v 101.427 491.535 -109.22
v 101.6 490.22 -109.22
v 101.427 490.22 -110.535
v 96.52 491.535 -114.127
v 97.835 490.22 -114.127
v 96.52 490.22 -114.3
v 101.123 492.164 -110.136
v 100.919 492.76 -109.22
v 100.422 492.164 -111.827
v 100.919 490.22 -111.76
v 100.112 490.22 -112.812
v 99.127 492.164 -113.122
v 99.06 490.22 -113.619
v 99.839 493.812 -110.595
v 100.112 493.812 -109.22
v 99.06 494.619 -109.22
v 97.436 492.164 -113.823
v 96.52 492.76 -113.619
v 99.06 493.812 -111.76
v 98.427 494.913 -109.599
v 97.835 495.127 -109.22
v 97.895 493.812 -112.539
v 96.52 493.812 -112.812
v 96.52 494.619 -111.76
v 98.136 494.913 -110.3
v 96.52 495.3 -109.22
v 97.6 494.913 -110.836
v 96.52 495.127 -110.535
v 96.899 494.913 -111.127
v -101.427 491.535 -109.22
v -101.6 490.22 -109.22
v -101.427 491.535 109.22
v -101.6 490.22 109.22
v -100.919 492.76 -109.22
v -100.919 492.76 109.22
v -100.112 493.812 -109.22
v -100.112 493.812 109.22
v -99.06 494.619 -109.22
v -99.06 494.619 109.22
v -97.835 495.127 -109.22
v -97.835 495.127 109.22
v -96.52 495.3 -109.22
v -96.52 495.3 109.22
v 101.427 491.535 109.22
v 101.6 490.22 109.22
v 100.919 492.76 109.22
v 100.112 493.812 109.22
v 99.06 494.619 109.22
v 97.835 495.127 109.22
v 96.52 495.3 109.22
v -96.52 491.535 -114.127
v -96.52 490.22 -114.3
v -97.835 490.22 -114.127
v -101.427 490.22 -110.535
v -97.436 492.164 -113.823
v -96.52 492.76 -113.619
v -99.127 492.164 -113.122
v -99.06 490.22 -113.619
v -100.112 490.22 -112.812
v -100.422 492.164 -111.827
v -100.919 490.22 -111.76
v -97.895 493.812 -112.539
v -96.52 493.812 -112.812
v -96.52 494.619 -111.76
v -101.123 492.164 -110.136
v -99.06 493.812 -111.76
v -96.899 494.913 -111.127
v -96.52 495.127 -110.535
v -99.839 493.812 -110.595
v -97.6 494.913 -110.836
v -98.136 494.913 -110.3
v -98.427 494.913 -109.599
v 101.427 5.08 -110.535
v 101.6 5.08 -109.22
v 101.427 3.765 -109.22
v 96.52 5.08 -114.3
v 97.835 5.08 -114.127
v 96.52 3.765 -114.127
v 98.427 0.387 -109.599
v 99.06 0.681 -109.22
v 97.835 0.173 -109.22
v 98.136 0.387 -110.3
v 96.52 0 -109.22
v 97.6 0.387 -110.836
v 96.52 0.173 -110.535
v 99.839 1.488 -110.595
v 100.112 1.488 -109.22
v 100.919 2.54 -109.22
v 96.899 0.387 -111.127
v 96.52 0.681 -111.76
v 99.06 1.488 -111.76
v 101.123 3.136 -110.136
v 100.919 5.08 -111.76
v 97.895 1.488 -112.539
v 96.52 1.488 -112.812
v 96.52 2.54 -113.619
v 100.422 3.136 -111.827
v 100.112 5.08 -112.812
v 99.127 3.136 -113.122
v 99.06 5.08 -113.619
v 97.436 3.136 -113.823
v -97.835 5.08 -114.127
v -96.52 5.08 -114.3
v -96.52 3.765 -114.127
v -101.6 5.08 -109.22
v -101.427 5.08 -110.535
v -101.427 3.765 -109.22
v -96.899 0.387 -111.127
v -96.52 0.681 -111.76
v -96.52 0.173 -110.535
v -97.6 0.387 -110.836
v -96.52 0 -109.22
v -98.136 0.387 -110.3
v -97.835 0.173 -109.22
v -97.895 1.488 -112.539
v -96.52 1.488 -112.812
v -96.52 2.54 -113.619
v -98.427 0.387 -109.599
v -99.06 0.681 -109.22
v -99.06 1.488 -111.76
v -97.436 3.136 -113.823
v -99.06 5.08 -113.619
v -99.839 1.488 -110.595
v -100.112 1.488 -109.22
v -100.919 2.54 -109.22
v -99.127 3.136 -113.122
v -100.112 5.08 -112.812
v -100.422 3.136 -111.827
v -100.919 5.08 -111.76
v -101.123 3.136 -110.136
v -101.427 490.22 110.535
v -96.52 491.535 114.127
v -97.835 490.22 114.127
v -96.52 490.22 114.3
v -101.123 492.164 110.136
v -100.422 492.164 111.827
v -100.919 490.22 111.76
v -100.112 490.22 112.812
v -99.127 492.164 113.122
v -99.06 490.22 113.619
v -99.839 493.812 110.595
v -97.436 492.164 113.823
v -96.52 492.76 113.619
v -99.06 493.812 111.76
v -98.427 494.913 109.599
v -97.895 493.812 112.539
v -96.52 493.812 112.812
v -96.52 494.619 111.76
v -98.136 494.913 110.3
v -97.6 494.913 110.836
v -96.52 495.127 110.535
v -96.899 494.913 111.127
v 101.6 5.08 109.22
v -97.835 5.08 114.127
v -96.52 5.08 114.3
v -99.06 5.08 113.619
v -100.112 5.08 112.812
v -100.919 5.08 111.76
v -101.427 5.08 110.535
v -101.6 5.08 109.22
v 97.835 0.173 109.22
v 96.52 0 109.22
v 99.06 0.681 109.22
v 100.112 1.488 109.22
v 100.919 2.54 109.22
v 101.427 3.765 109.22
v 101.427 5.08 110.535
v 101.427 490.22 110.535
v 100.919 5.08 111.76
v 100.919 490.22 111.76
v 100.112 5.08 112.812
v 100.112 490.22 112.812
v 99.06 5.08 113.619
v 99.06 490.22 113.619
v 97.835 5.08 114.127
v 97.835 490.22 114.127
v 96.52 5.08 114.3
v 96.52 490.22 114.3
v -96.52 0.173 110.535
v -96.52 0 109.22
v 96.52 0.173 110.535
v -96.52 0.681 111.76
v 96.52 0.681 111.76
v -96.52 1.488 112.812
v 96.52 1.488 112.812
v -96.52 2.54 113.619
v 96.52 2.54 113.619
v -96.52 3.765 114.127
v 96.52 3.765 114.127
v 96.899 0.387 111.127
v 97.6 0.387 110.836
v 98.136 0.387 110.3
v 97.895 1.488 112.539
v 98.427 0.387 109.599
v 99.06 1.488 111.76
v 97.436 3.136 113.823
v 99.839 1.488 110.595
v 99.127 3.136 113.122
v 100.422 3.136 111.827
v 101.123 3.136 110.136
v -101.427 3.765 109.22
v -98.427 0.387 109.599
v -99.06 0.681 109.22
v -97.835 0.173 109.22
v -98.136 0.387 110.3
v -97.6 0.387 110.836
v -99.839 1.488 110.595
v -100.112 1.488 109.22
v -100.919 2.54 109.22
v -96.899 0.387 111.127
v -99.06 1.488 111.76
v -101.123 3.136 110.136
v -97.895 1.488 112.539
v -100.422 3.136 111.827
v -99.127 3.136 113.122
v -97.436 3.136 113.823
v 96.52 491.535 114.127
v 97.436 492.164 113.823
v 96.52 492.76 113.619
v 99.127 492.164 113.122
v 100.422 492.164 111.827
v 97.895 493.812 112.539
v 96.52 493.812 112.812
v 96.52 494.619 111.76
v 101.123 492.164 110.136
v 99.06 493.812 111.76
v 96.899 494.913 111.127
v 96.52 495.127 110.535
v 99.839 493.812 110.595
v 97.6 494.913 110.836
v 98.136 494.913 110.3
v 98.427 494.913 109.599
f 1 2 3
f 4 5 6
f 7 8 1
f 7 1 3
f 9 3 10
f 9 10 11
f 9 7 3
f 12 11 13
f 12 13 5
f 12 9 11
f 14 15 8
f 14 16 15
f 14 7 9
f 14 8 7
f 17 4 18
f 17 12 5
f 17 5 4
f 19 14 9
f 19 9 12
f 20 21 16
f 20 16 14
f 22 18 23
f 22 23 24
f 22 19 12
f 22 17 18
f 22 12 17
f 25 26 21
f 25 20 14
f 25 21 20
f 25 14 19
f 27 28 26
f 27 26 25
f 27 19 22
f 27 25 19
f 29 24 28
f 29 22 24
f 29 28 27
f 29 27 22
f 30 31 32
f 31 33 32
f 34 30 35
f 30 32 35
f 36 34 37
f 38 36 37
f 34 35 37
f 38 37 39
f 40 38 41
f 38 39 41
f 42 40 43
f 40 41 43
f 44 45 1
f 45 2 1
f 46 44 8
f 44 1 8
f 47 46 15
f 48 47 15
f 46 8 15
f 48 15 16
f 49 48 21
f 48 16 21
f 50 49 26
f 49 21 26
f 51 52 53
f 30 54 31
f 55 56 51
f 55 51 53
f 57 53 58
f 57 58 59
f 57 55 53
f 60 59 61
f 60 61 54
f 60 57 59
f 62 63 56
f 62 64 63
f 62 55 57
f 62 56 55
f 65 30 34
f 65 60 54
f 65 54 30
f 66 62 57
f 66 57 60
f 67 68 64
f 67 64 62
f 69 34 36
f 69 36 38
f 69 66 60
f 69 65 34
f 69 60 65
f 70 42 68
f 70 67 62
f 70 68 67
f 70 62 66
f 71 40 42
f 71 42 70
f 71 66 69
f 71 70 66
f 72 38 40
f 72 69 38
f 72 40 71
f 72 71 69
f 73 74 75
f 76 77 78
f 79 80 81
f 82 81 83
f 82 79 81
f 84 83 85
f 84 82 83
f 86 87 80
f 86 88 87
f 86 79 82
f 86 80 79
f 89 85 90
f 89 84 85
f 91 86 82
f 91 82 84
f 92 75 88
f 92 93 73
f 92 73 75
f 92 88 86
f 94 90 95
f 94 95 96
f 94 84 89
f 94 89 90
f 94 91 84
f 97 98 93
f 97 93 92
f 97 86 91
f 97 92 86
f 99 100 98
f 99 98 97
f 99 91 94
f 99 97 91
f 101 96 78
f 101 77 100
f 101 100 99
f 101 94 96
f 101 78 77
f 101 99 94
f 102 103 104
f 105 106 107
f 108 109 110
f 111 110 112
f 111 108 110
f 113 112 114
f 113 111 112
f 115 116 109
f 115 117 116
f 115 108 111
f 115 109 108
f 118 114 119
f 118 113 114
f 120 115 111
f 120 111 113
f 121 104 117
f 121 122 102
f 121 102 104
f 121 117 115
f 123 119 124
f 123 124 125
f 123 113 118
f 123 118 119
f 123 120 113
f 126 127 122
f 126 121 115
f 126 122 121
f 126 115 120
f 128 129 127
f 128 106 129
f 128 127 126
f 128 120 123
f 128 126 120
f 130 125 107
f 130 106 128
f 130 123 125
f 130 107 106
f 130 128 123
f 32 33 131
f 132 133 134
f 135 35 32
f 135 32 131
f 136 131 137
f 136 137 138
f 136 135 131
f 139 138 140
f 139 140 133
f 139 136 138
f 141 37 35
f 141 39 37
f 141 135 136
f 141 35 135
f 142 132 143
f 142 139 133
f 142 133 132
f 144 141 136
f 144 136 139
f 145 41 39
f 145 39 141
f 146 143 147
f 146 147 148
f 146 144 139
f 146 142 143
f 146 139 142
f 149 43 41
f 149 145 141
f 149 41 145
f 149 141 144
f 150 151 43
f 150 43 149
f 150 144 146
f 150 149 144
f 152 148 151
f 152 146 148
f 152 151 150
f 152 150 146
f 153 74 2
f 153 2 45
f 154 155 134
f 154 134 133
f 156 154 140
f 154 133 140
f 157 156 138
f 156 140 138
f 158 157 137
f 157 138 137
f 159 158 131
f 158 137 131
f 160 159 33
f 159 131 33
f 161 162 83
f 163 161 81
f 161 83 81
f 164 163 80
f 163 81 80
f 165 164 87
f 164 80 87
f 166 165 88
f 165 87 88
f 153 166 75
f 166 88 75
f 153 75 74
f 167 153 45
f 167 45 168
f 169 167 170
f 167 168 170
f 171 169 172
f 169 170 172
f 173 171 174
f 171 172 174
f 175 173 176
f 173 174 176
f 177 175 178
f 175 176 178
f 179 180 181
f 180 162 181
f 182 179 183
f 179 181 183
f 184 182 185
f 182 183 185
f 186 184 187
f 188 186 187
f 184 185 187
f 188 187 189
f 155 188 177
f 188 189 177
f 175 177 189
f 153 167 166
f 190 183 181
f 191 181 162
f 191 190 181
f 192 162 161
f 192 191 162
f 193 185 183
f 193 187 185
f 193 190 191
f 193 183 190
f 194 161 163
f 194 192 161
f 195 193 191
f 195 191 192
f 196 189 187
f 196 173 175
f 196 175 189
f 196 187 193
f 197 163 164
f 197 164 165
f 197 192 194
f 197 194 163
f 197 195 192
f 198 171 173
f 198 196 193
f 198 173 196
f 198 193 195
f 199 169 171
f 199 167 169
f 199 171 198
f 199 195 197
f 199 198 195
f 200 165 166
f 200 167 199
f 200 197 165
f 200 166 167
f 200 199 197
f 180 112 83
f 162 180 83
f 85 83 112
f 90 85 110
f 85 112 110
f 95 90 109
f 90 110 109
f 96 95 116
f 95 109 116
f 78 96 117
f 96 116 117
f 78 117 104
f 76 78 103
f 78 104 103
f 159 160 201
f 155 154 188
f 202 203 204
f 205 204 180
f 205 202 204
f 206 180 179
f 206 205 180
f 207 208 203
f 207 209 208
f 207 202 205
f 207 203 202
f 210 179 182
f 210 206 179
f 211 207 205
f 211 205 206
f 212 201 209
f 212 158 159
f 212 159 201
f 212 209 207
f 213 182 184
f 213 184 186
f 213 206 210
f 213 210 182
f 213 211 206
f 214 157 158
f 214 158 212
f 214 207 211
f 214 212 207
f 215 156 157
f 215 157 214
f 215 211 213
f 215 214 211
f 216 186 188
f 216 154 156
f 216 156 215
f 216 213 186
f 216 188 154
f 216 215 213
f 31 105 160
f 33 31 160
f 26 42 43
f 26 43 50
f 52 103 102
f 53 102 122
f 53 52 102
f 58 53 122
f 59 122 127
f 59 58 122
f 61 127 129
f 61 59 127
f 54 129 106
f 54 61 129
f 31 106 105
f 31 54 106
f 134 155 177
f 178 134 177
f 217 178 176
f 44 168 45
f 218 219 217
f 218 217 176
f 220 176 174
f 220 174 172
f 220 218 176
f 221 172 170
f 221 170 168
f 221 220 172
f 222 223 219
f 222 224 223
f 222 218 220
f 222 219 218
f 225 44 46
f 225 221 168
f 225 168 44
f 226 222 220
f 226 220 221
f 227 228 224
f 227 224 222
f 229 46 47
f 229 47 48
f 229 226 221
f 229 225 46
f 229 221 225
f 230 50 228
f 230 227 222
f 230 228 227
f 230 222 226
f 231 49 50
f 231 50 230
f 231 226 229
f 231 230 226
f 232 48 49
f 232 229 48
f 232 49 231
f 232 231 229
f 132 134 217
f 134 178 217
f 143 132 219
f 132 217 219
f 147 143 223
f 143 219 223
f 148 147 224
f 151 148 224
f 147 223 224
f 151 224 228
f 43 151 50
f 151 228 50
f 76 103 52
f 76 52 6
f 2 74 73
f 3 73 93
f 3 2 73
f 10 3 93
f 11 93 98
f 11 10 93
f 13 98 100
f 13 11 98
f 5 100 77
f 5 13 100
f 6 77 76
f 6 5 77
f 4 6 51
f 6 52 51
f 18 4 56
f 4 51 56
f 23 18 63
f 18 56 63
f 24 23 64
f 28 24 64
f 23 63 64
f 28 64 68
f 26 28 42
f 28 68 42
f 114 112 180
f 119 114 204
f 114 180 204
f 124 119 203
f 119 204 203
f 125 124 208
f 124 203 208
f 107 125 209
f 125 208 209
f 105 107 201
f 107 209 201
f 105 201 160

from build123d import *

# Parameters (mm, degrees)
F0_W     = 203.2
F0_H     = 228.6
F1_DEPTH = 495.3
F2_R     = 5.08
F3_R     = 5.08
F4_R     = 5.08
F5_R     = 5.08
F6_R     = 5.08
F7_R     = 5.08


with BuildPart() as f1:
    # F0 (on Front) → F1 (new body)
    with BuildSketch(Plane.XZ):
        Rectangle(F0_W, F0_H)
    extrude(amount=-F1_DEPTH)

    # F2
    f2_edges = [f1.edges().sort_by_distance(p)[0] for p in [
        (101.6, 247.65, 114.3),
    ]]
    fillet(f2_edges, radius=F2_R)

    # F3
    f3_edges = [f1.edges().sort_by_distance(p)[0] for p in [
        (-101.6, 247.65, 114.3),
    ]]
    fillet(f3_edges, radius=F3_R)

    # F4
    f4_edges = [f1.edges().sort_by_distance(p)[0] for p in [
        (101.6, 247.65, -114.3),
    ]]
    fillet(f4_edges, radius=F4_R)

    # F5
    f5_edges = [f1.edges().sort_by_distance(p)[0] for p in [
        (-101.6, 247.65, -114.3),
    ]]
    fillet(f5_edges, radius=F5_R)

    # F6
    f6_edges = [f1.edges().sort_by_distance(p)[0] for p in [
        (0, 0, 114.3),
    ]]
    fillet(f6_edges, radius=F6_R)

    # F7
    f7_edges = [f1.edges().sort_by_distance(p)[0] for p in [
        (0, 495.3, 114.3),
    ]]
    fillet(f7_edges, radius=F7_R)


solid = f1.part
